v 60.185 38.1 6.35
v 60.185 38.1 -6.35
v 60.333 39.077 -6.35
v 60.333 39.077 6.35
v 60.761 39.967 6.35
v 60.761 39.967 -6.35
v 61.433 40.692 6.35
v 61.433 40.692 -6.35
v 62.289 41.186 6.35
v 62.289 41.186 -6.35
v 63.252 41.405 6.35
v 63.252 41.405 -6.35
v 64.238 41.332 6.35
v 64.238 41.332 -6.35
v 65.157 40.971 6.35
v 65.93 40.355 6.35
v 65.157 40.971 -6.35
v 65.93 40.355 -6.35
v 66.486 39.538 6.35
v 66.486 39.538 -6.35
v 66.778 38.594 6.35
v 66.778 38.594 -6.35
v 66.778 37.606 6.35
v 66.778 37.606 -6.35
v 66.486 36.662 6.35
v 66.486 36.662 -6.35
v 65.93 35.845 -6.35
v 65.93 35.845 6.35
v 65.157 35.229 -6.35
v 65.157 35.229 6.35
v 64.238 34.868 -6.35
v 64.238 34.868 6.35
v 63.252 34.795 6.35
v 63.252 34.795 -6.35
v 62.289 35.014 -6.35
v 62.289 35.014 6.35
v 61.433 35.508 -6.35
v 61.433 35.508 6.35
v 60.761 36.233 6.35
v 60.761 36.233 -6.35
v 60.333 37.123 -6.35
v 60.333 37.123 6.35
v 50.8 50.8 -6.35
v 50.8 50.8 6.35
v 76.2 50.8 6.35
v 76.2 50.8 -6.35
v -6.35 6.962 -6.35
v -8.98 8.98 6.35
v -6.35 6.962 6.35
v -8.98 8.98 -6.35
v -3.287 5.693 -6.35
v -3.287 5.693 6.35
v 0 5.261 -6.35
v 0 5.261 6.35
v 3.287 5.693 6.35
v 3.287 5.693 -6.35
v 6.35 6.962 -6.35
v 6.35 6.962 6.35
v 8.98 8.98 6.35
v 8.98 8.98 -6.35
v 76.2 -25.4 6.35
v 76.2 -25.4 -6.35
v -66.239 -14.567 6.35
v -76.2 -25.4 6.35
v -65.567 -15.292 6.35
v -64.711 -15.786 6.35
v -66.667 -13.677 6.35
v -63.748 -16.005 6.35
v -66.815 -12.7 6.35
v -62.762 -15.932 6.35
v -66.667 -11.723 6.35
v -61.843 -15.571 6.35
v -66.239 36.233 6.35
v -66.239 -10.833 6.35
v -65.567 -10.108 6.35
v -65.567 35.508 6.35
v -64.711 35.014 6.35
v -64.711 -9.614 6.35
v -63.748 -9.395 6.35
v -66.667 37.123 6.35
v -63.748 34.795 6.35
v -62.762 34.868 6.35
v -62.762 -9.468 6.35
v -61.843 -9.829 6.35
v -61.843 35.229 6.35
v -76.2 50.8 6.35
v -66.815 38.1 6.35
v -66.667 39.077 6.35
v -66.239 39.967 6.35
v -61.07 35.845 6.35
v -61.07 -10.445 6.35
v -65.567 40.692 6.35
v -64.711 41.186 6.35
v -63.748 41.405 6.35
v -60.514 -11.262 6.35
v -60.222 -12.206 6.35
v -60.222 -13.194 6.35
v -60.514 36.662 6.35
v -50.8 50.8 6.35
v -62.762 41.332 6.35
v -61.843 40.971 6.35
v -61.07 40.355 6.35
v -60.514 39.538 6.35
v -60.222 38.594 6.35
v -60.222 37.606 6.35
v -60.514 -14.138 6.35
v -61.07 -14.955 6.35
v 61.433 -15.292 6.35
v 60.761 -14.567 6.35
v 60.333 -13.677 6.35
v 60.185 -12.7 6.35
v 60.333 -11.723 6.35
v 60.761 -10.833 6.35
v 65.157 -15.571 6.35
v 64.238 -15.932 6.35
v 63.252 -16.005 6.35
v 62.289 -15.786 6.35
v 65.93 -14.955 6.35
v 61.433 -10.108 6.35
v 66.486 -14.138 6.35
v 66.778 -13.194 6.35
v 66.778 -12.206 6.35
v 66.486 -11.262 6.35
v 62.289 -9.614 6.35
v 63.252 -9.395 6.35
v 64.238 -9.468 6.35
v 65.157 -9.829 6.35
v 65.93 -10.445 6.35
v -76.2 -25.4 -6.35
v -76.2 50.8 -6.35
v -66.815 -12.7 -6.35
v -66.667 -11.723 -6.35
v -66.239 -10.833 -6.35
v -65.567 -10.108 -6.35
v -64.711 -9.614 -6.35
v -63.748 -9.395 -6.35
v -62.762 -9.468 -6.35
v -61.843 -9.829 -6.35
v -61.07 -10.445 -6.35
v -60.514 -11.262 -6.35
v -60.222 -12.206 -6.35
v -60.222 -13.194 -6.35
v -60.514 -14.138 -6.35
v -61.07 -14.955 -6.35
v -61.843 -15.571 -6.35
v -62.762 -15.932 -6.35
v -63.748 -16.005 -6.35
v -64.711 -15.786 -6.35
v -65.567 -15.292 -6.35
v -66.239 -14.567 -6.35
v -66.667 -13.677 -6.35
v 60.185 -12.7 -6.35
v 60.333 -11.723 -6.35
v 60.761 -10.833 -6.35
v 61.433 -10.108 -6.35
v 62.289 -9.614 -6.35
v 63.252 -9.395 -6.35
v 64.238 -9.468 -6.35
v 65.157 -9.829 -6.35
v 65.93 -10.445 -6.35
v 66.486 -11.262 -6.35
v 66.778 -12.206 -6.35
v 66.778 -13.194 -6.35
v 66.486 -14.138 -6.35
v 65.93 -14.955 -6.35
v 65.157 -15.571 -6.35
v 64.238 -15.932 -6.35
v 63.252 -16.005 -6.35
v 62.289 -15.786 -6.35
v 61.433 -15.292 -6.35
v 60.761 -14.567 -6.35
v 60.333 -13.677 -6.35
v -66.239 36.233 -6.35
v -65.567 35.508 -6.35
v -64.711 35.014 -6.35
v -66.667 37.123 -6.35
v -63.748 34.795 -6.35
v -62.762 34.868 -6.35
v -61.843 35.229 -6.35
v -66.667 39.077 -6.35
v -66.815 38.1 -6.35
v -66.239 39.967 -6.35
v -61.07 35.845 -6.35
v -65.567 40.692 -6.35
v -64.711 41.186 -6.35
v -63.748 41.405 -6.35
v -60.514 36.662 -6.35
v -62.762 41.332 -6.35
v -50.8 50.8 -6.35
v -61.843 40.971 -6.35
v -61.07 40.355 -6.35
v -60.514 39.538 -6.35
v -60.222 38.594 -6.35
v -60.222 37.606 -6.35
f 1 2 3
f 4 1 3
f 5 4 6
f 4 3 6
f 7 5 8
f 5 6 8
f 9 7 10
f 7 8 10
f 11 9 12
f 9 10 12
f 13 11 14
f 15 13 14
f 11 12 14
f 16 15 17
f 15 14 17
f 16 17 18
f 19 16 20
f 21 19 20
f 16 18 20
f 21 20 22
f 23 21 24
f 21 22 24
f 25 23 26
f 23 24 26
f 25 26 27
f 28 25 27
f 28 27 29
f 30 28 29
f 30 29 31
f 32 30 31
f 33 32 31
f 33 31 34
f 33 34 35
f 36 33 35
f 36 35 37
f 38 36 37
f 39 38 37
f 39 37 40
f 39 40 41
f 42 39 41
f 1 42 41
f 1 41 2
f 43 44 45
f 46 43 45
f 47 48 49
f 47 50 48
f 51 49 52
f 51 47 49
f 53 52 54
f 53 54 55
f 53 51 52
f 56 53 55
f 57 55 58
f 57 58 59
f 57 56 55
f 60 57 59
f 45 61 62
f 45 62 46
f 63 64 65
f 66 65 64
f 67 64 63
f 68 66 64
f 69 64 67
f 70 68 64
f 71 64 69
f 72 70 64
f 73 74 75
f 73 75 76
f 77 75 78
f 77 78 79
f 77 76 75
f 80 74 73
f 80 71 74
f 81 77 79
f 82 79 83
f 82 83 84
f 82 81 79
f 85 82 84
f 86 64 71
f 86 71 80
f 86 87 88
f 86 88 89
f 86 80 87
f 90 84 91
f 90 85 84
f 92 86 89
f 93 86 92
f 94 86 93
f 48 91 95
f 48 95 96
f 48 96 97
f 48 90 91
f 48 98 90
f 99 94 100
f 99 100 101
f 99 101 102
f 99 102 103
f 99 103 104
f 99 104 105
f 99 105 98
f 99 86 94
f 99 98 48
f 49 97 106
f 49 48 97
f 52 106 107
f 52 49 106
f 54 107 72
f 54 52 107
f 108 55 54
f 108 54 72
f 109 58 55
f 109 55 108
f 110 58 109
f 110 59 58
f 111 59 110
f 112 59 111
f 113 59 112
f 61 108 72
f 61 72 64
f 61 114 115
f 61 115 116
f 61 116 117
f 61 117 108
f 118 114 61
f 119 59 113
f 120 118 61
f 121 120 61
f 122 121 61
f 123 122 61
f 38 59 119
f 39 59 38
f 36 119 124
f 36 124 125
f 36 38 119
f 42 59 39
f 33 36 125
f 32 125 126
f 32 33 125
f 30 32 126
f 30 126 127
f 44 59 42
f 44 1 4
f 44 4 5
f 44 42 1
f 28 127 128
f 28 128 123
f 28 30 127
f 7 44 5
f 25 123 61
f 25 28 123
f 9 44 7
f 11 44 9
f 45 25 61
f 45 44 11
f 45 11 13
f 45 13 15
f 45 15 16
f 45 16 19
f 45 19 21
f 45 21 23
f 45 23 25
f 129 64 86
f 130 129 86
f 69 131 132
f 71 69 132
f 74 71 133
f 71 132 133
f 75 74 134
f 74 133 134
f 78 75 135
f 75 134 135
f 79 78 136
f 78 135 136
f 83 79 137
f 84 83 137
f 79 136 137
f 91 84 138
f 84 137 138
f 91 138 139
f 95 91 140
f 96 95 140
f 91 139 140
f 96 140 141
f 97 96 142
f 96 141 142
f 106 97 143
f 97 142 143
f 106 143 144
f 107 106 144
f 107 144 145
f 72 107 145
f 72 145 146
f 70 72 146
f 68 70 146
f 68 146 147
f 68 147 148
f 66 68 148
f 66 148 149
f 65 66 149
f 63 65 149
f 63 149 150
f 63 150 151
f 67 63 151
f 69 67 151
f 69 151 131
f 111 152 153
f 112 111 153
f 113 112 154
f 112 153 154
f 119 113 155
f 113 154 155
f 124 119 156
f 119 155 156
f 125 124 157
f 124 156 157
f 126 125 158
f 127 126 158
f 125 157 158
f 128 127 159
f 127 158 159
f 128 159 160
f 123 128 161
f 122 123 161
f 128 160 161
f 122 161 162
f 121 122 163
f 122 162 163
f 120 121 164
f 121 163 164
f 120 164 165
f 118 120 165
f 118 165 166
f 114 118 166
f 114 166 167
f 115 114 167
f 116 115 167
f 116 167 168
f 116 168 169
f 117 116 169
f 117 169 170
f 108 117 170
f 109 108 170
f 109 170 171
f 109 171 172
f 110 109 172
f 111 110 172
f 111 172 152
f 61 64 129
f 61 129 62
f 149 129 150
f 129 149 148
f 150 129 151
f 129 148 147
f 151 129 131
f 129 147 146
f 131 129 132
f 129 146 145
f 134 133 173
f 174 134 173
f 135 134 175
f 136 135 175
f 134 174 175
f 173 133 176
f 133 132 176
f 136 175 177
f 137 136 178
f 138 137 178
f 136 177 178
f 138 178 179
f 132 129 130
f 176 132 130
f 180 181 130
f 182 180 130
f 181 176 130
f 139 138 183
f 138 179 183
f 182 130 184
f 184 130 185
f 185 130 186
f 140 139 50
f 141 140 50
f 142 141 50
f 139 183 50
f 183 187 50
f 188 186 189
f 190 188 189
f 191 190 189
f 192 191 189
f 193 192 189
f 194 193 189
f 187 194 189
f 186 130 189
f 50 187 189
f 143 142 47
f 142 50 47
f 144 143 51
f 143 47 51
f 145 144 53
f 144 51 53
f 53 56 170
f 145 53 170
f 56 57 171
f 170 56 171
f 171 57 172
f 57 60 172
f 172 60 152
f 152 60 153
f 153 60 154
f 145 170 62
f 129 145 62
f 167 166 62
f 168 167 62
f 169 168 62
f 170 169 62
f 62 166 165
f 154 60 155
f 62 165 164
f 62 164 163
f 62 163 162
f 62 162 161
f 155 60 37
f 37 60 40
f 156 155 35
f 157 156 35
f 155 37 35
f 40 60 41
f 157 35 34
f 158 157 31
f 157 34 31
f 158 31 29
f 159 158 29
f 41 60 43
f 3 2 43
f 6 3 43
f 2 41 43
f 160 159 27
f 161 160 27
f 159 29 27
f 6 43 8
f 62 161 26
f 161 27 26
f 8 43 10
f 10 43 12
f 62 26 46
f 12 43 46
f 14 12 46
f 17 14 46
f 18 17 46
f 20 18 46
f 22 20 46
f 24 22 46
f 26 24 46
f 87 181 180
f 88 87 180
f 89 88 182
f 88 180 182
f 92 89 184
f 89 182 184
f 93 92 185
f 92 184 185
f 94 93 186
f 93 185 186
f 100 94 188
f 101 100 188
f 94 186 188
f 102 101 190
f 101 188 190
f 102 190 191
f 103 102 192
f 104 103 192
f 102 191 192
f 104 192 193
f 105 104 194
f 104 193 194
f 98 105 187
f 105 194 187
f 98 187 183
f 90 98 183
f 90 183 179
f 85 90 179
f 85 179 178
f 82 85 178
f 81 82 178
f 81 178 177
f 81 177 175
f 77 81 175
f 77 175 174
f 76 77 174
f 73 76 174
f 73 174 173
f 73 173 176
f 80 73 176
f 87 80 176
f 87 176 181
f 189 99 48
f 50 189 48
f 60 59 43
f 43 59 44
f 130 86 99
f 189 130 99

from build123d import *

# Parameters (mm, degrees)
SKETCH1_W                = 152.4
SKETCH1_H                = 101.6
BOSS_EXTRUDE1_DEPTH      = 6.35
CUT_EXTRUDE1_DEPTH       = 93.457395594
SKETCH3_W                = 152.4
SKETCH3_H                = 25.4
CUT_EXTRUDE2_DEPTH       = 93.457395594
G_0_261_DIAMETER_HOLE1_D = 6.6294
FILLET1_R                = 12.7


with BuildPart() as part:
    # Sketch1 → Boss-Extrude1 (new, symmetric)
    with BuildSketch(Plane.XY):
        Rectangle(SKETCH1_W, SKETCH1_H)
    extrude(amount=BOSS_EXTRUDE1_DEPTH, both=True)

    # Sketch2 → Cut-Extrude1 (cut, through all)
    with BuildSketch(Plane.XY.offset(6.35)):
        Polygon((0, 0), (50.8, 50.8), (-50.8, 50.8), align=None)
    extrude(amount=-CUT_EXTRUDE1_DEPTH, mode=Mode.SUBTRACT)

    # Sketch3 → Cut-Extrude2 (cut, through all)
    with BuildSketch(Plane.XY.offset(6.35)):
        with Locations((0, -38.1)):
            Rectangle(SKETCH3_W, SKETCH3_H)
    extrude(amount=-CUT_EXTRUDE2_DEPTH, mode=Mode.SUBTRACT)

    # G (0.261) Diameter Hole1 (through all)
    with Locations(Plane.XY.offset(6.35)):
        with Locations((-63.5, 38.1), (-63.5, -12.7), (63.5, -12.7), (63.5, 38.1)):
            Hole(G_0_261_DIAMETER_HOLE1_D / 2)

    # Fillet1
    fillet1_edges = [part.edges().sort_by_distance(p)[0] for p in [
        (0, 0, 0),
    ]]
    fillet(fillet1_edges, radius=FILLET1_R)


solid = part.part
